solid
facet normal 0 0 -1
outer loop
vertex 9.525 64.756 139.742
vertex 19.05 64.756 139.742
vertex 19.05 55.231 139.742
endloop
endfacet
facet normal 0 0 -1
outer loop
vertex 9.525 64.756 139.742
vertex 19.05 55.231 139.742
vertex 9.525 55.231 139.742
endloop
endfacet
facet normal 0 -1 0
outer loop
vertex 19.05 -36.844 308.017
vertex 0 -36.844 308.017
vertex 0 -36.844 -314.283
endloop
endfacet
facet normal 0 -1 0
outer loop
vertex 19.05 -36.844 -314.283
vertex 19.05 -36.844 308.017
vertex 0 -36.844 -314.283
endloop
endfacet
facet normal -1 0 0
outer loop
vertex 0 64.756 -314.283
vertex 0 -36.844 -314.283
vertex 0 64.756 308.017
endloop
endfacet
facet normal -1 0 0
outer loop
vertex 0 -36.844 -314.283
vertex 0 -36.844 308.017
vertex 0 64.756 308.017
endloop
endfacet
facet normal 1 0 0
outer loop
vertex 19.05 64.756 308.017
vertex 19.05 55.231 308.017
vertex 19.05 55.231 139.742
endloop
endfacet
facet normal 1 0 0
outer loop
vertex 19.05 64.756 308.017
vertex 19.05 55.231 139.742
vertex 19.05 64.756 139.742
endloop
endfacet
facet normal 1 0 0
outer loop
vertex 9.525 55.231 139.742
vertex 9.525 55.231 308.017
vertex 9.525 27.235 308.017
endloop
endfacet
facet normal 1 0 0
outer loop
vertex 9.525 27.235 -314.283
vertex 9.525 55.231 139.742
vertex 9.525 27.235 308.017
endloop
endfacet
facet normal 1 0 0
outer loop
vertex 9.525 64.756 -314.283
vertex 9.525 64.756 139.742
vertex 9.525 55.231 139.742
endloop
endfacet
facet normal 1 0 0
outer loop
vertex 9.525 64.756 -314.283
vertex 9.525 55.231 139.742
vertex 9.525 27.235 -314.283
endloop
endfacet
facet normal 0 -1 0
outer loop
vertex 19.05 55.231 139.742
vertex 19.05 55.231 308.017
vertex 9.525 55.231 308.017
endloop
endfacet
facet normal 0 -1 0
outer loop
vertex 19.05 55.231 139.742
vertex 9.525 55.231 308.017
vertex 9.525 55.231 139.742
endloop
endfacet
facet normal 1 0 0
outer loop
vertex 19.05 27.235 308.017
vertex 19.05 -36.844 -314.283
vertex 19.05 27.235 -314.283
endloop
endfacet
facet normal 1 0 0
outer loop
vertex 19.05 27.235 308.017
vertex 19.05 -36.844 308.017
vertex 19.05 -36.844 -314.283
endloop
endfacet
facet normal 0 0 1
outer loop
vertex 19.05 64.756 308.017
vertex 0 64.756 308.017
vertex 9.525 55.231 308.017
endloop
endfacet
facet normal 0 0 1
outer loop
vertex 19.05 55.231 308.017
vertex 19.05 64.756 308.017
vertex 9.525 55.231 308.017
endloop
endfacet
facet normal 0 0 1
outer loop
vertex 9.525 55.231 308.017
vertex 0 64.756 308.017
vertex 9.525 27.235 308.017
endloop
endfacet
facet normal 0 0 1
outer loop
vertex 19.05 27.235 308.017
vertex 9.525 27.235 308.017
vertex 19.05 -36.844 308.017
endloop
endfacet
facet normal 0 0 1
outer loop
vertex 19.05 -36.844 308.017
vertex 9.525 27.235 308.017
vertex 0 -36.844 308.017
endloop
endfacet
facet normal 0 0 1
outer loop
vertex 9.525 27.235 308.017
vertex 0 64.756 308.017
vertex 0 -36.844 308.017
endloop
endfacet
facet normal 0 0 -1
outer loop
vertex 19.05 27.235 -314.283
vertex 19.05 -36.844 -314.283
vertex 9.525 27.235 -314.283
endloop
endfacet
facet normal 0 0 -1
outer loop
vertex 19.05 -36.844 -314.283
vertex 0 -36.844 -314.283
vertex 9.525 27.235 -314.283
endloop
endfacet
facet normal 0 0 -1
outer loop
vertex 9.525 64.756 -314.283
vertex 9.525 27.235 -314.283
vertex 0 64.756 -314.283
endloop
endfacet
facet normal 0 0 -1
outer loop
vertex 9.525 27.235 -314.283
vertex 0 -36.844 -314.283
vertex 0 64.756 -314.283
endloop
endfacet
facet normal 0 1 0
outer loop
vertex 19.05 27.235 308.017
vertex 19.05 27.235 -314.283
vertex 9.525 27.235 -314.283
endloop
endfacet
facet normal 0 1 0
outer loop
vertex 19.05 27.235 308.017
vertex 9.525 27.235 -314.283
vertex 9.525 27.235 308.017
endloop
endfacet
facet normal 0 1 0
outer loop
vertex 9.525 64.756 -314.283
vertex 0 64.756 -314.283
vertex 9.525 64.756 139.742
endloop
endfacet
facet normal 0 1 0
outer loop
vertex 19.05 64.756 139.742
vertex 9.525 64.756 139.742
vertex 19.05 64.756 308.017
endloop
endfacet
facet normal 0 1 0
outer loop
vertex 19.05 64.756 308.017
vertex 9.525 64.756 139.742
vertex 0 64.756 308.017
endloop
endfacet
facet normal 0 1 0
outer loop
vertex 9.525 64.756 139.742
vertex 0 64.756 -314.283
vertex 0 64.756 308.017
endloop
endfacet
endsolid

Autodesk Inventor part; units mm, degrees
ref_plane "YZ Plane" through (0, 0, 0) normal (1, 0, 0) x (0, 1, 0)
ref_plane "XZ Plane" through (0, 0, 0) normal (0, 1, 0) x (-1, 0, 0)
ref_plane "XY Plane" through (0, 0, 0) normal (0, 0, 1) x (1, 0, 0)
sketch "Sketch1" plane through (0, 0, 0) normal (1, 0, 0) x (0, 1, 0)
  line L0 (64.7557, 308.0174) -> (-36.8443, 308.0174)
  line L1 (-36.8443, 308.0174) -> (-36.8443, -314.2826)
  line L2 (-36.8443, -314.2826) -> (64.7557, -314.2826)
  line L3 (64.7557, -314.2826) -> (64.7557, 308.0174)
  dimension "d2" = 622.3
  dimension "d3" = 101.6
extrude "Board" add sketch "Sketch1" along normal blind 19.05
sketch "Sketch8" plane through (19.05, 0, 0) normal (1, 0, 0) x (0, 0, -1)
  line L0 (-308.0174, 55.2307) -> (314.2826, 55.2307)
  line L1 (314.2826, 55.2307) -> (314.2826, 45.7057)
  line L2 (314.2826, 45.7057) -> (-308.0174, 45.7057)
  line L3 (-308.0174, 45.7057) -> (-308.0174, 55.2307)
  line L4 (-308.0174, 64.7557) -> (-308.0174, -36.8443) projected
  line L5 (314.2826, -36.8443) -> (314.2826, 64.7557) projected
  line L6 (314.2826, 64.7557) -> (-308.0174, 64.7557) projected
  point P0 (0, 0)
  dimension "d22" = 9.525
  dimension "d23" = 9.525
extrude "Lenghtwise Dado for Base" cut sketch "Sketch8" against normal blind 9.525 contours L0 L1 L2 L3
sketch "Sketch 9" plane through (0, 64.7557, 308.0174) normal (0, 1, 0) x (1, 0, 0)
  line L0 (19.05, 168.275) -> (9.525, 168.275)
  line L1 (9.525, 168.275) -> (9.525, 622.3)
  line L2 (9.525, 622.3) -> (19.05, 622.3)
  line L3 (19.05, 622.3) -> (19.05, 168.275)
  line L4 (19.05, 622.3) -> (19.05, 0) projected
  line L5 (0, 622.3) -> (19.05, 622.3) projected
  point P0 (0, 308.0174)
  dimension "d26" = 454.025
  dimension "d27" = 9.525
extrude "Lengthwise stop dado for Sides" cut sketch "Sketch 9" against normal blind 9.525
sketch "Sketch12" plane through (19.05, 0, 0) normal (1, 0, 0) x (0, 0, -1)
  line L0 (-308.0174, 64.7557) -> (-308.0174, -36.8443) projected
  line L1 (314.2826, -36.8443) -> (314.2826, 45.7057) projected
  line L2 (-308.0174, 46.2852) -> (314.2826, 46.2852)
  line L3 (314.2826, 46.2852) -> (314.2826, 27.2352)
  line L4 (314.2826, 27.2352) -> (-308.0174, 27.2352)
  line L5 (-308.0174, 27.2352) -> (-308.0174, 46.2852)
  dimension "d39" = 19.05
extrude "Extrusion10" cut sketch "Sketch12" against normal blind 9.525
properties part number "Base Runner Side"
